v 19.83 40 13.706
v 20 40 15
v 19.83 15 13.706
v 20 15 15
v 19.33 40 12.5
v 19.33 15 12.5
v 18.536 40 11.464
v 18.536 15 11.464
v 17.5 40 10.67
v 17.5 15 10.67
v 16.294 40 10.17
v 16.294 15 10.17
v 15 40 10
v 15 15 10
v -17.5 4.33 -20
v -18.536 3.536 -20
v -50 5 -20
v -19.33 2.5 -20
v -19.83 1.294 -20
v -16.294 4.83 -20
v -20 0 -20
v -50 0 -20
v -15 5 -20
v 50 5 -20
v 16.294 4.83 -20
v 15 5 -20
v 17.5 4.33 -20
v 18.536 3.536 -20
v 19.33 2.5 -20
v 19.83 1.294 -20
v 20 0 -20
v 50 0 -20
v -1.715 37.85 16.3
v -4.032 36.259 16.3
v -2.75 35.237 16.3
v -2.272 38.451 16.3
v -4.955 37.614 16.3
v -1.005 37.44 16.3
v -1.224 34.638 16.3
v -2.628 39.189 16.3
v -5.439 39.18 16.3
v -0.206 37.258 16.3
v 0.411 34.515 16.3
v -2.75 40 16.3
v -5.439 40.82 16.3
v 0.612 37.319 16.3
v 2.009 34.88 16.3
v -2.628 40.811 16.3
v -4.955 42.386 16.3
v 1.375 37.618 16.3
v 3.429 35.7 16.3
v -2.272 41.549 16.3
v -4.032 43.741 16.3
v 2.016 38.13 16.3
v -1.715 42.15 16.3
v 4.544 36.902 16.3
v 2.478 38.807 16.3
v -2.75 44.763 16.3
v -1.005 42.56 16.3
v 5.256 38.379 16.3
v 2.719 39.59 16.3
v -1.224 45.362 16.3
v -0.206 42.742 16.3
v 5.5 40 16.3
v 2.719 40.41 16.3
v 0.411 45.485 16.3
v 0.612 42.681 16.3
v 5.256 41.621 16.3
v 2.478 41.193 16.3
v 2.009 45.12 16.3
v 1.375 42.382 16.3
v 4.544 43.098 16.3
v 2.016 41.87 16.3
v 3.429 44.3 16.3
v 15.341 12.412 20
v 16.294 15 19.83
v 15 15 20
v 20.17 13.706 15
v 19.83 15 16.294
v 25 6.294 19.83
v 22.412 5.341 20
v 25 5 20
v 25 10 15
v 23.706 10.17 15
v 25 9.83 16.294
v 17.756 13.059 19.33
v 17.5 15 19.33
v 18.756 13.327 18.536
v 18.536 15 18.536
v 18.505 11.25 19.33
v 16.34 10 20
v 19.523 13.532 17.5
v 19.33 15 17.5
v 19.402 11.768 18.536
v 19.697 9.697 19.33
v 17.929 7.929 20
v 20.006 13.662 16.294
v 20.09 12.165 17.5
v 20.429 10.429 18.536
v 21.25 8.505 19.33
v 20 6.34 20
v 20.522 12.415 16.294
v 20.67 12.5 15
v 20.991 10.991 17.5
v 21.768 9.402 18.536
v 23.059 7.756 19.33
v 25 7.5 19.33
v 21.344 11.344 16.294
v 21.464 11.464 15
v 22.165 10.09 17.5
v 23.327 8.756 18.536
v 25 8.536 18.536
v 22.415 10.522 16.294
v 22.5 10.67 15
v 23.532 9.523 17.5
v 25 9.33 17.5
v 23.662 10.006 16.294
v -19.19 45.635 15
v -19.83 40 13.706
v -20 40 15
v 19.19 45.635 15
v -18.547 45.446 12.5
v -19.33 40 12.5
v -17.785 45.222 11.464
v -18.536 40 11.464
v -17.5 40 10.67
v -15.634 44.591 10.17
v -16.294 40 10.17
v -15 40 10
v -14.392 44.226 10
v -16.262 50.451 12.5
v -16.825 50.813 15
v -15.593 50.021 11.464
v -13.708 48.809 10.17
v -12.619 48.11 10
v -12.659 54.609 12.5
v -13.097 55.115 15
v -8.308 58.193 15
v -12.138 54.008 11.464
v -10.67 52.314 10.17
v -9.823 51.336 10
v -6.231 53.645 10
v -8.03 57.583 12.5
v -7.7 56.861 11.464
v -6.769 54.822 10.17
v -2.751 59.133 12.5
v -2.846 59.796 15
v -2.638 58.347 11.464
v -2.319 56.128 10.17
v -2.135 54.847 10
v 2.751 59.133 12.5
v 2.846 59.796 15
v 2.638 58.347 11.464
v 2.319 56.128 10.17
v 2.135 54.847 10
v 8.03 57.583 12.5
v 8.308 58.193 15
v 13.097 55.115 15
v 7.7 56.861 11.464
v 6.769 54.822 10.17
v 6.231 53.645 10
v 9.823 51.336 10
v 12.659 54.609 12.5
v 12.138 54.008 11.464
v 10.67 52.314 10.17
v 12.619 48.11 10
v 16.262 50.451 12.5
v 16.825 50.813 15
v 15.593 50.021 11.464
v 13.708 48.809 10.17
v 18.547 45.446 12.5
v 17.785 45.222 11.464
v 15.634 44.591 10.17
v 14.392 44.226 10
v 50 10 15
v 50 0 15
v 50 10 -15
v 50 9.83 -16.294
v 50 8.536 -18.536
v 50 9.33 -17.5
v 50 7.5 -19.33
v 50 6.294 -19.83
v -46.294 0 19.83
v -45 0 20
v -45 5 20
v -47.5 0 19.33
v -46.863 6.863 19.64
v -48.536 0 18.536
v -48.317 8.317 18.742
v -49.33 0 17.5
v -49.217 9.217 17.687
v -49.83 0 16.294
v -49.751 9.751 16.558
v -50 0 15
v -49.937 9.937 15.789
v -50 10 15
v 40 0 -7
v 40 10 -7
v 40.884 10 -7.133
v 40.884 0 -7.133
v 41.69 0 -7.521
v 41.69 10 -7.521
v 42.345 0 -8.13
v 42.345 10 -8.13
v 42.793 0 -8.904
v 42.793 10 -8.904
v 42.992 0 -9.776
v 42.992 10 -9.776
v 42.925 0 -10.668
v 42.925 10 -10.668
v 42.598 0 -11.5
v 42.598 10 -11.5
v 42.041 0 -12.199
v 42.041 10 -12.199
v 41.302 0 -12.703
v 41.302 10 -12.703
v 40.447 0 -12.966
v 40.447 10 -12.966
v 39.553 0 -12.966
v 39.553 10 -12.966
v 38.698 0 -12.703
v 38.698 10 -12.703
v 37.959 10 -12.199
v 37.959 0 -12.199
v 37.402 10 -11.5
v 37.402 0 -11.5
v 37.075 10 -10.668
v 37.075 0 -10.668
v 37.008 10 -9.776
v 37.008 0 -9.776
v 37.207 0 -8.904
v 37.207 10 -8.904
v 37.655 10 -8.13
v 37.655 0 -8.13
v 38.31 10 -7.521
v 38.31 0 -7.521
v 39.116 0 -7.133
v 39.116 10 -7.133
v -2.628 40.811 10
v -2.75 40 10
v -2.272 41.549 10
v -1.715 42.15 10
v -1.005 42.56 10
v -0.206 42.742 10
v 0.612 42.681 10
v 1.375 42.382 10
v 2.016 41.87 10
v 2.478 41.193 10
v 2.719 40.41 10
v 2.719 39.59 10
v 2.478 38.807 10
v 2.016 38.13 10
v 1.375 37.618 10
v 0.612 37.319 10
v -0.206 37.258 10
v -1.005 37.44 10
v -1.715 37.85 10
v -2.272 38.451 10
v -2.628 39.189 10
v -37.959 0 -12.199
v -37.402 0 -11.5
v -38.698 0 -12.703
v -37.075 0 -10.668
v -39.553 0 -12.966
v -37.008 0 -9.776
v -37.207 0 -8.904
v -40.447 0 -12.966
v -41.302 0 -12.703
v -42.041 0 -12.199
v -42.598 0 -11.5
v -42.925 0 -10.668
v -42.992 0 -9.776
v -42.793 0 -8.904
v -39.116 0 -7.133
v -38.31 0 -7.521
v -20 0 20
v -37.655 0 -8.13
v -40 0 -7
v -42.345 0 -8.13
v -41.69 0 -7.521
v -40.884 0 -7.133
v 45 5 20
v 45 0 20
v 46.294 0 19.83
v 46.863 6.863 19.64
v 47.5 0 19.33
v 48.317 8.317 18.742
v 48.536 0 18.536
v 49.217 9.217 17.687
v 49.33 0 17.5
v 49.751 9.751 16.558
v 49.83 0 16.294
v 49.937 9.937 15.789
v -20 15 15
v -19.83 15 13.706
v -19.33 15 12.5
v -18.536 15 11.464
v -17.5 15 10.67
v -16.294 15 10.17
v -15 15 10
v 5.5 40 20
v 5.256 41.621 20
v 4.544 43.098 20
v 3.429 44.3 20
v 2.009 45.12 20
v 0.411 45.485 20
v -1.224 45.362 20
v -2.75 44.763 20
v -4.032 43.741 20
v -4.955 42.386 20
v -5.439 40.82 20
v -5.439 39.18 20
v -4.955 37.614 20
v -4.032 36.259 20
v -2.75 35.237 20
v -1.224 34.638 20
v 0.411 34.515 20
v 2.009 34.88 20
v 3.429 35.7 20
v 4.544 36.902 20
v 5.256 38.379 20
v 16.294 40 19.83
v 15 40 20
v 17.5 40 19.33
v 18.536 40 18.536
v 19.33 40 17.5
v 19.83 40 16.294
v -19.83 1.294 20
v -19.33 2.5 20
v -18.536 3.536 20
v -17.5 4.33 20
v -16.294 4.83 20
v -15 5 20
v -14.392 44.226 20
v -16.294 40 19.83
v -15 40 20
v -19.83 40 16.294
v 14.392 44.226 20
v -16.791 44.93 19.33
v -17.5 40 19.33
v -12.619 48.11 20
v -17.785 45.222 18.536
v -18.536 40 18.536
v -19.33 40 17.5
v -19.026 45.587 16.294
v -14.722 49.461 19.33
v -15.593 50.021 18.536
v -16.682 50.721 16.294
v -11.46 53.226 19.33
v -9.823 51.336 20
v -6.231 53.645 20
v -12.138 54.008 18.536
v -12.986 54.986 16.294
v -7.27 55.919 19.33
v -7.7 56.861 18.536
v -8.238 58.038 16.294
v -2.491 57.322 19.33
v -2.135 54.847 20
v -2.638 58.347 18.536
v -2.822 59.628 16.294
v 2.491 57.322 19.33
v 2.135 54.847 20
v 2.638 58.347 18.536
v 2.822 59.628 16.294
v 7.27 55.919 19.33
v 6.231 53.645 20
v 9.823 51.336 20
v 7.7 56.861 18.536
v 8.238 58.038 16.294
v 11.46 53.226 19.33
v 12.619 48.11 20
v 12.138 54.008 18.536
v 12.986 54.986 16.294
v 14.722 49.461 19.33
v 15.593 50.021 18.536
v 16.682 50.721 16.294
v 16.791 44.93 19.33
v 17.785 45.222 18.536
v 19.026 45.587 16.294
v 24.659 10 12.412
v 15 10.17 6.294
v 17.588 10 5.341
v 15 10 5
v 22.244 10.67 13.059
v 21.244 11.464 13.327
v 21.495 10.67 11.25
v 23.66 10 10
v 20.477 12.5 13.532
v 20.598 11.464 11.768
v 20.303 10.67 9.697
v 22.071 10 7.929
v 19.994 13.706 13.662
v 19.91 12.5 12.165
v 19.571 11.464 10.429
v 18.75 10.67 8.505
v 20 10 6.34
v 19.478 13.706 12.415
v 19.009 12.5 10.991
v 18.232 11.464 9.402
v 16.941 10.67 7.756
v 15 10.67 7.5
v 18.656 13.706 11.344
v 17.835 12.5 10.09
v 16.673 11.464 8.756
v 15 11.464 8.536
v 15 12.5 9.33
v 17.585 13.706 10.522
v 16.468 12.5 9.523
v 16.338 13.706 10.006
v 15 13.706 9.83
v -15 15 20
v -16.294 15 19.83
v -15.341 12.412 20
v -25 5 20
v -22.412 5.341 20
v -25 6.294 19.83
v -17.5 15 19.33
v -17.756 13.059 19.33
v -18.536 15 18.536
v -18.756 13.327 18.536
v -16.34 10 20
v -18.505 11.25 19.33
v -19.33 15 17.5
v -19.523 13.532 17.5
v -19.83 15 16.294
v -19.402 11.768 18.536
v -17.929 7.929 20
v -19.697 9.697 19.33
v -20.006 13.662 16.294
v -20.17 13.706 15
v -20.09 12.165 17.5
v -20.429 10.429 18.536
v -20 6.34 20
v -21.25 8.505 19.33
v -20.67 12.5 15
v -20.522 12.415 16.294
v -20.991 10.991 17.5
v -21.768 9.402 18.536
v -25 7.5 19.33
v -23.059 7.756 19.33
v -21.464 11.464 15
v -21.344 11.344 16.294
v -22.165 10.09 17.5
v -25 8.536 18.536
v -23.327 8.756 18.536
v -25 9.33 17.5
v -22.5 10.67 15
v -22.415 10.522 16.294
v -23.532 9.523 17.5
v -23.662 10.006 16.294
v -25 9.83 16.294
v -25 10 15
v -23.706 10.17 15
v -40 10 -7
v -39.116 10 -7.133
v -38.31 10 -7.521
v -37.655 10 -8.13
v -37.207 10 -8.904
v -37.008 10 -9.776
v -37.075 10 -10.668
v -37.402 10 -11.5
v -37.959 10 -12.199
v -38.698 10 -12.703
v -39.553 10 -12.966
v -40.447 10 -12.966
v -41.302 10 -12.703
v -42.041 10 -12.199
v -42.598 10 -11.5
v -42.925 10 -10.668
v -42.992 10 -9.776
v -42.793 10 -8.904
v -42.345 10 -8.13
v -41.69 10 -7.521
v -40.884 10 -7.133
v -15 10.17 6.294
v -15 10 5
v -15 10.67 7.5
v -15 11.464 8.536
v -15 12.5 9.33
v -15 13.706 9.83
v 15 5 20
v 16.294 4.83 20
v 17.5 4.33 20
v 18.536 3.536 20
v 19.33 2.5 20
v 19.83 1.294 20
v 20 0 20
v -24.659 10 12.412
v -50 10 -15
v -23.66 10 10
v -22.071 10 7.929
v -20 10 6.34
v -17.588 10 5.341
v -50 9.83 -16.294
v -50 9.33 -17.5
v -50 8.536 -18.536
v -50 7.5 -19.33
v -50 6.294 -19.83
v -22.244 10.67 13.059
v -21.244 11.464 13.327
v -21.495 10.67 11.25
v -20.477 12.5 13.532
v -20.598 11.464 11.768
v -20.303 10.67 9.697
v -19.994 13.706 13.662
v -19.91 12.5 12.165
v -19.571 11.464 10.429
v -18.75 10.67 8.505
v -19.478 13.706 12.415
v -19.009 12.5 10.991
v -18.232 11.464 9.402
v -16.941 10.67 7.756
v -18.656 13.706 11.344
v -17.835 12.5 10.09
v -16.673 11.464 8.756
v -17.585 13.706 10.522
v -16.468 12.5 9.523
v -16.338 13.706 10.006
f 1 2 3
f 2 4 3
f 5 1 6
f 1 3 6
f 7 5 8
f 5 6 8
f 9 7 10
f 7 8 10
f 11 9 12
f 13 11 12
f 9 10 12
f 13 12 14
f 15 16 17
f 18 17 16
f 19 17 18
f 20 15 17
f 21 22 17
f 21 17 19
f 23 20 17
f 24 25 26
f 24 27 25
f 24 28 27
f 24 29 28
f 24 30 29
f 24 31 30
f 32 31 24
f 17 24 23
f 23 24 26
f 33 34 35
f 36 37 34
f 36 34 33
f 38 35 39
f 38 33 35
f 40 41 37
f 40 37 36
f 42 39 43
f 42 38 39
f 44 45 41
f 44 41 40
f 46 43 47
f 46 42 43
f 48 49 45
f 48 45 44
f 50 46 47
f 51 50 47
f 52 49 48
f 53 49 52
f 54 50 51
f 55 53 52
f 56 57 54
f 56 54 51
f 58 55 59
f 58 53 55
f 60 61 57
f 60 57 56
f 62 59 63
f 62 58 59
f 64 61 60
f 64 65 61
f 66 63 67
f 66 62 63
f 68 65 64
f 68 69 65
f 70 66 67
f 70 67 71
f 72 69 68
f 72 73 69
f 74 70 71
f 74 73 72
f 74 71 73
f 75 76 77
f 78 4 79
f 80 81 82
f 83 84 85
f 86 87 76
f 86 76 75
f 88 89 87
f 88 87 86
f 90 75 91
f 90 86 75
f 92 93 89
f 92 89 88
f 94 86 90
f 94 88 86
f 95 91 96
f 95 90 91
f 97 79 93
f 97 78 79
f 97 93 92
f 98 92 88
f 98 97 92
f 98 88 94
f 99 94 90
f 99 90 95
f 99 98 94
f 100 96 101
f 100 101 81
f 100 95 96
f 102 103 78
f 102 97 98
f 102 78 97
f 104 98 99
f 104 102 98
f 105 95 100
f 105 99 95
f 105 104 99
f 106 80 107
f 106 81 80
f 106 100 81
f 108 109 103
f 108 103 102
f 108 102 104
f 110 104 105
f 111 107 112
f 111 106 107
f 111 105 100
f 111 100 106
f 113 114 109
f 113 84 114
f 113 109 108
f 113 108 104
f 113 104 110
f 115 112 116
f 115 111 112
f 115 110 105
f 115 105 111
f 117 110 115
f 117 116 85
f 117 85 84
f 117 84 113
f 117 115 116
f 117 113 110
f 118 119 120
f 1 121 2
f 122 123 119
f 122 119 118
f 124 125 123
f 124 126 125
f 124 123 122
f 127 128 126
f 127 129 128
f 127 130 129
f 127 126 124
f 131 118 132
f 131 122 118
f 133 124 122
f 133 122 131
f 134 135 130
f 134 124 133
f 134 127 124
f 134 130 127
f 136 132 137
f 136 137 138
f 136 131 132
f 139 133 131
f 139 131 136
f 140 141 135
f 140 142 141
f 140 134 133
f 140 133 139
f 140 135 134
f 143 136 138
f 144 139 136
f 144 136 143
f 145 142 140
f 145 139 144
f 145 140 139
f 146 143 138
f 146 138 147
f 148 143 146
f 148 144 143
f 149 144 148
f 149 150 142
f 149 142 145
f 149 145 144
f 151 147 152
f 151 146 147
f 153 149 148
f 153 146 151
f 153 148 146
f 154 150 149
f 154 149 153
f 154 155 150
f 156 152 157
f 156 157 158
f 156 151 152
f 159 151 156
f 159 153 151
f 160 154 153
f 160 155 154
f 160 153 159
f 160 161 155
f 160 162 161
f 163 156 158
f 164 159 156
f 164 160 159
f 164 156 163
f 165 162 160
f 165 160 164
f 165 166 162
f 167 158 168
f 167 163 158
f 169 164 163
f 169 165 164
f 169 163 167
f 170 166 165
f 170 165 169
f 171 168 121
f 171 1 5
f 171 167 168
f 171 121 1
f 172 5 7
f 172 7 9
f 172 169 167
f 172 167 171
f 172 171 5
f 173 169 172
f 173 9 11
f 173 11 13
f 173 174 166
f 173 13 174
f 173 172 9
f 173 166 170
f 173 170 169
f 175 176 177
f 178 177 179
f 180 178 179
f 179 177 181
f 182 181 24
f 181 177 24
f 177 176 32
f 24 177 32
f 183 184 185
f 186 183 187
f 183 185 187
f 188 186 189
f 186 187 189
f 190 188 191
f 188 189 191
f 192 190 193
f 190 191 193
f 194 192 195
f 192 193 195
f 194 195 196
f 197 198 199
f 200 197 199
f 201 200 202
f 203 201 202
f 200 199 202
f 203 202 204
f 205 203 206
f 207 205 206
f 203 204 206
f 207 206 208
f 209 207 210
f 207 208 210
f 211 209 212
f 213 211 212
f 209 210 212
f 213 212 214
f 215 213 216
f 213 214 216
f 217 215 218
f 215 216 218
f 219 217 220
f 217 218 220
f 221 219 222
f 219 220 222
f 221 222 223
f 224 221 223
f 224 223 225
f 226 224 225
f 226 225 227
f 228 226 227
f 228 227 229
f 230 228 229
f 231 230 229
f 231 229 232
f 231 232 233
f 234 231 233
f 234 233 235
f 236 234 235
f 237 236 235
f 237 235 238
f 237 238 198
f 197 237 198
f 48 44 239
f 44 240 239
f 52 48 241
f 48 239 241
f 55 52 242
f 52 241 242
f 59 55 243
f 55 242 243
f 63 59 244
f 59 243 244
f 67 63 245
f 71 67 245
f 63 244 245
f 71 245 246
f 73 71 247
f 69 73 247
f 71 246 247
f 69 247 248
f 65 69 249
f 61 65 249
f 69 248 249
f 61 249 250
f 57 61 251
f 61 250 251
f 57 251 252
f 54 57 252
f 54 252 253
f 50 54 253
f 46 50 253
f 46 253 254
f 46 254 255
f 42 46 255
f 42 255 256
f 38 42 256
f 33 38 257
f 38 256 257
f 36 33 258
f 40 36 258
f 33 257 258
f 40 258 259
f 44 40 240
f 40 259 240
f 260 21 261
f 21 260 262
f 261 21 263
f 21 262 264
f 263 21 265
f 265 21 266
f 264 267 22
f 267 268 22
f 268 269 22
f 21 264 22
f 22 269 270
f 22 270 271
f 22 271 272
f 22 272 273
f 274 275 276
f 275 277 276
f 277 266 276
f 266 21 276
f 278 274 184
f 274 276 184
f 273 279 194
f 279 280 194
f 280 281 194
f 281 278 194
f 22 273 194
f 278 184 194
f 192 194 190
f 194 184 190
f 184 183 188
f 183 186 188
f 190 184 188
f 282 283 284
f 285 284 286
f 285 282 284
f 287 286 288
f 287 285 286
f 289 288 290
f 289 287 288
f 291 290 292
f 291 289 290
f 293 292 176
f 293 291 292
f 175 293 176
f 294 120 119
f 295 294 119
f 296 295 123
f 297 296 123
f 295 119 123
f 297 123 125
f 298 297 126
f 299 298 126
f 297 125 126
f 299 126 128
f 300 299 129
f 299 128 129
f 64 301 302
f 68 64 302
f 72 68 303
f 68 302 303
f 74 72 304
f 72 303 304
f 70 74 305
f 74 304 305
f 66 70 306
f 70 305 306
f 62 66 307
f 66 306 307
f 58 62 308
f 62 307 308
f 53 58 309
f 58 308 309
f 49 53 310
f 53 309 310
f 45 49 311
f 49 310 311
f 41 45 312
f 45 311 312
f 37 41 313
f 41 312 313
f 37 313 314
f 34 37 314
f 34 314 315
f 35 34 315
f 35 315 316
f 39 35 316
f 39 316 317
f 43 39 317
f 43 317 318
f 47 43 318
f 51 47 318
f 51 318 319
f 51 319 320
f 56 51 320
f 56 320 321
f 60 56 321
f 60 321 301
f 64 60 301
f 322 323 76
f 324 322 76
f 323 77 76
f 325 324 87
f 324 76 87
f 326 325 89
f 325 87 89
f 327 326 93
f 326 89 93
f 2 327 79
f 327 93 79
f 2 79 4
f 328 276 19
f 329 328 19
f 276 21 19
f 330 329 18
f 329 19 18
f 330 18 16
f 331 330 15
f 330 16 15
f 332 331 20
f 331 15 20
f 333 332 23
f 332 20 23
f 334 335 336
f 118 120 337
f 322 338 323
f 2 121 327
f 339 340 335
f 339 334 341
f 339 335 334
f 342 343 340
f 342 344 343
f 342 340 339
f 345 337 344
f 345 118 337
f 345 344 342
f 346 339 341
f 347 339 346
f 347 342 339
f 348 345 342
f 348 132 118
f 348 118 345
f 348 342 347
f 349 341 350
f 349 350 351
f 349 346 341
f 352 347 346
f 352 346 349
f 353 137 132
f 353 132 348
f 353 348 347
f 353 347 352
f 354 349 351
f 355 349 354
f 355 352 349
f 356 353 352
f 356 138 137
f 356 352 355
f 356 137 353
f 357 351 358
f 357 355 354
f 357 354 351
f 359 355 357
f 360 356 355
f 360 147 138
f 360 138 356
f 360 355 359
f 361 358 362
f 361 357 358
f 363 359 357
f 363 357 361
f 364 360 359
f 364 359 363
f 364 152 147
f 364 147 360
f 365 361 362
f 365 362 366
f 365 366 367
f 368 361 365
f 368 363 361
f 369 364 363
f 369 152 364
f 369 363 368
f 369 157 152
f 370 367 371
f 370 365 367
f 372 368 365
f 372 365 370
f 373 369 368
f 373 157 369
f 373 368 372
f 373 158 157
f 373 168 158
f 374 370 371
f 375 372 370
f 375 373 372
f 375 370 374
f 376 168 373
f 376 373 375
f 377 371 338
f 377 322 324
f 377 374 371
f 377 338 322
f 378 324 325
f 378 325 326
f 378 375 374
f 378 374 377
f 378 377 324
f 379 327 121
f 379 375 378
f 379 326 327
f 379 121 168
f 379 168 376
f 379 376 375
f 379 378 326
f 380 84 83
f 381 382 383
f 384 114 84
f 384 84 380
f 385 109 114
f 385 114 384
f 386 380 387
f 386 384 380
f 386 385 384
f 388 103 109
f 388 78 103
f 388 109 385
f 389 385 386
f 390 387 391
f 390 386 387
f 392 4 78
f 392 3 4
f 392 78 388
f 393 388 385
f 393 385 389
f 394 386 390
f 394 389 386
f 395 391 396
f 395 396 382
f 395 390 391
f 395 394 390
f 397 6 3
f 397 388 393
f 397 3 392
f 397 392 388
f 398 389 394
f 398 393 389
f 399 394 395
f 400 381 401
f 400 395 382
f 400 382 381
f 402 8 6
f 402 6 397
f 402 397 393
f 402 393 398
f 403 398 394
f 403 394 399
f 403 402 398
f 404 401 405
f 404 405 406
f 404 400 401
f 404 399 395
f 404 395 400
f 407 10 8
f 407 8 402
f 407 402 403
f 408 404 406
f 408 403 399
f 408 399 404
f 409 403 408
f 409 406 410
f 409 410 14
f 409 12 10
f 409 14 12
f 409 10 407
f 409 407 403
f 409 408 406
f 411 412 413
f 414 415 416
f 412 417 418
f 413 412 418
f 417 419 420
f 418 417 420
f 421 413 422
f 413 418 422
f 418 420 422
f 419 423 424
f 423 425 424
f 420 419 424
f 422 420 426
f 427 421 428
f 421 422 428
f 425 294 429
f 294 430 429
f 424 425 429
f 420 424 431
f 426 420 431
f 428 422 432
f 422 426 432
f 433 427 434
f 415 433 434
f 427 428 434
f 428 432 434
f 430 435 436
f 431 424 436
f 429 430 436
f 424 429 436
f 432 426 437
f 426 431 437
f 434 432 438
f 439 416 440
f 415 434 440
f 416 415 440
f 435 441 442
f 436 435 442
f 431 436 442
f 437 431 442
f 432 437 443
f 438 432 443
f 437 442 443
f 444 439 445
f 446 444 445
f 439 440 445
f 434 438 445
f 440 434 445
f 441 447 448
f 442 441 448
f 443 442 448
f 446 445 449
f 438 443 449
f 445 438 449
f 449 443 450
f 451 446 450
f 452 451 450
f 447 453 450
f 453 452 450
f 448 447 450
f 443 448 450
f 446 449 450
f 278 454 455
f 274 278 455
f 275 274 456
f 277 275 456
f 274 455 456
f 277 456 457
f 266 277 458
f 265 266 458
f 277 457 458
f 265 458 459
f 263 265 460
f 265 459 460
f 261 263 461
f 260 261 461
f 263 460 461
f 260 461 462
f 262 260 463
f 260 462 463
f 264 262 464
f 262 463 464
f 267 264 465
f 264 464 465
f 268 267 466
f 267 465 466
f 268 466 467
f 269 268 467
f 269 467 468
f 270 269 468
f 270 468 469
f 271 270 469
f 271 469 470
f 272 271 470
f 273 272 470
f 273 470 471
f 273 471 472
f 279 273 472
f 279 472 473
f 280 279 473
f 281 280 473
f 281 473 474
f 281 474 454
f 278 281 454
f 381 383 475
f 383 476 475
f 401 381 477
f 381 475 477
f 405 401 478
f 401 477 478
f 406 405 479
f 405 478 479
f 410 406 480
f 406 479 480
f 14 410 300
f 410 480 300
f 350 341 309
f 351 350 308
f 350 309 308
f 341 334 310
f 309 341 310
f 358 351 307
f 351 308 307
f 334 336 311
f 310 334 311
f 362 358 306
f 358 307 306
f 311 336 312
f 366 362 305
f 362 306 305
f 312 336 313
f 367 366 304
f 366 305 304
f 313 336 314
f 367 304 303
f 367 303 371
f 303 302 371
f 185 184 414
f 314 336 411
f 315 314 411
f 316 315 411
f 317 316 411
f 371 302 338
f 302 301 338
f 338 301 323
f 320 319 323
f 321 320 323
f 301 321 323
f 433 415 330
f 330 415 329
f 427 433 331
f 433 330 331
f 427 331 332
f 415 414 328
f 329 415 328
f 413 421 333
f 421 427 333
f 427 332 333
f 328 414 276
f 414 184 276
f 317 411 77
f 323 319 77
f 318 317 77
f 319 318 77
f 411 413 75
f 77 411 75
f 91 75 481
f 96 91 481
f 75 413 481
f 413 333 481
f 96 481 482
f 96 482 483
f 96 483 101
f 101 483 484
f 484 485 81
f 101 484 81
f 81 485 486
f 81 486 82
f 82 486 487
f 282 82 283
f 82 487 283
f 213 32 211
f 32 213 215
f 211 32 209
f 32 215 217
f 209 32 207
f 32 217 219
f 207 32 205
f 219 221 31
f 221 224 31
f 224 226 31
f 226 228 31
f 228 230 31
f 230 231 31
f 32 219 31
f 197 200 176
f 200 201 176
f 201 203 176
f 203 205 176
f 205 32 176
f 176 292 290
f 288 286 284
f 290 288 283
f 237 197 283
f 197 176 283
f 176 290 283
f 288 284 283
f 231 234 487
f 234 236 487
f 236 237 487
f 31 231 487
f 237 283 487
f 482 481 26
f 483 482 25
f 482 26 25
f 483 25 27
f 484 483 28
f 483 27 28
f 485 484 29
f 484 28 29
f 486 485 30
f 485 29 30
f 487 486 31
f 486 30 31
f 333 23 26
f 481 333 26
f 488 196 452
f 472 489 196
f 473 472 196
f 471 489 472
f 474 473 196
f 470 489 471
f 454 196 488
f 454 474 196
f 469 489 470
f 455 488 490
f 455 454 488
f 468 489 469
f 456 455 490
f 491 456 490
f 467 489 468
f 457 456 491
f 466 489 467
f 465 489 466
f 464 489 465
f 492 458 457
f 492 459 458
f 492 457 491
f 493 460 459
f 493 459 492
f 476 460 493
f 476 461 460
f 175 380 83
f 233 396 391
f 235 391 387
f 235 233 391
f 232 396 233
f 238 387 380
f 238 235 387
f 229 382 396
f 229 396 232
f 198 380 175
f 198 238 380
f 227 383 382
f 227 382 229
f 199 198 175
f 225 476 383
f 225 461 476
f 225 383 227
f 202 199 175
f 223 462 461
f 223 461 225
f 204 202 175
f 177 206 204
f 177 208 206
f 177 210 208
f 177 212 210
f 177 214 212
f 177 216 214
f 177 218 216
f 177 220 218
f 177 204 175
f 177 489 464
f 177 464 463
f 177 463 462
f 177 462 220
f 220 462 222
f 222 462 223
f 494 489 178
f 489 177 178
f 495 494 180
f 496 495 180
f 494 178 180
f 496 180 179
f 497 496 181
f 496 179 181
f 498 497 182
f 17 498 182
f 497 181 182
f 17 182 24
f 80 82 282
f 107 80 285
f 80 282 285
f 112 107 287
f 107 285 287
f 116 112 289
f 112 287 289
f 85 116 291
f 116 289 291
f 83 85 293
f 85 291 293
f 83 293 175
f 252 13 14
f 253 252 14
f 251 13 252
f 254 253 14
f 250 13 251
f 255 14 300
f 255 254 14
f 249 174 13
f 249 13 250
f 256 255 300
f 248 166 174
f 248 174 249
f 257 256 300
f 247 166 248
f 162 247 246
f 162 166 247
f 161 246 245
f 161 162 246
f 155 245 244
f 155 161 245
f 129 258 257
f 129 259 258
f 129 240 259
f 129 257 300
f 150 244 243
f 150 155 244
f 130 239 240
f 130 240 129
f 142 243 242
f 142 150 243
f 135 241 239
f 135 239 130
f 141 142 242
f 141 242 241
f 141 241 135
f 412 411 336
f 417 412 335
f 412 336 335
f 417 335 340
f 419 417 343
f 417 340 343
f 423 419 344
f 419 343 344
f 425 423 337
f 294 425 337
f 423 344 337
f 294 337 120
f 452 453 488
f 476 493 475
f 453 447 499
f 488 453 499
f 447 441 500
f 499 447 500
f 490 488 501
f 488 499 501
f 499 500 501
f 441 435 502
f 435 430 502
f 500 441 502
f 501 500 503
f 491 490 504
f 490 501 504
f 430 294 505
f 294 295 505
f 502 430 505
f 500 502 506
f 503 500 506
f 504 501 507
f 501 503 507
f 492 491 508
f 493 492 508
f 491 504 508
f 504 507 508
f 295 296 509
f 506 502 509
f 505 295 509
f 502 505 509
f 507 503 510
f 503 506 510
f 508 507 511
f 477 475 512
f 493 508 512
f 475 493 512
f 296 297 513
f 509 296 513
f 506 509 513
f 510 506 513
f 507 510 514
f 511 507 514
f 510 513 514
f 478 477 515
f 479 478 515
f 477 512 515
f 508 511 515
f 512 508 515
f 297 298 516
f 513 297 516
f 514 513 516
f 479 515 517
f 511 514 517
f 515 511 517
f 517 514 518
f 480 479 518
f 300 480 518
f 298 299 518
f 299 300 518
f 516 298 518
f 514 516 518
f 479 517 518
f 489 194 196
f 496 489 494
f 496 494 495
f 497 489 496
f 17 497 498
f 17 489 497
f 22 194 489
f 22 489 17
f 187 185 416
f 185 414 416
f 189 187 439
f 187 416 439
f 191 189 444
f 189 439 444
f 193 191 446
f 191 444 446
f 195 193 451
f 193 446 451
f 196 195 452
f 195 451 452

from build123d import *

# Parameters (mm, degrees)
ESBO_O1_W                                           = 100
ESBO_O1_H                                           = 40
RESSALTO_EXTRUS_O1_DEPTH                            = 10
RESSALTO_EXTRUS_O2_DEPTH                            = 10
ESBO_O3_R                                           = 3
CORTE_EXTRUS_O1_DEPTH                               = 74.484692283
REBAIXO_PARA_PARAFUSO_COM_CABE_A_PANELA_D           = 5.5
REBAIXO_PARA_PARAFUSO_COM_CABE_A_PANELA_CBORE_D     = 11
REBAIXO_PARA_PARAFUSO_COM_CABE_A_PANELA_CBORE_DEPTH = 3.7
ESBO_O6_W                                           = 40
ESBO_O6_H                                           = 5
CORTE_EXTRUS_O2_DEPTH                               = 88.749643874
FILETE1_R                                           = 5


with BuildPart() as part:
    # Esboço1 → Ressalto-extrusão1 (new body)
    with BuildSketch(Plane(origin=(0, 0, 0), x_dir=(1, 0, 0), z_dir=(0, 1, 0))):
        Rectangle(ESBO_O1_W, ESBO_O1_H)
    extrude(amount=RESSALTO_EXTRUS_O1_DEPTH)

    # Esboço2 → Ressalto-extrusão2 (add)
    with BuildSketch(Plane.XY.offset(20)):
        with BuildLine():
            Line((-20, 0), (-20, 40))
            ThreePointArc((-20, 40), (0, 60), (20, 40))
            Line((20, 40), (20, 0))
            Line((20, 0), (-20, 0))
        make_face()
    extrude(amount=-RESSALTO_EXTRUS_O2_DEPTH)

    # Esboço3 → Corte-extrusão1 (cut, through all)
    with BuildSketch(Plane(origin=(0, 10, 0), x_dir=(1, 0, 0), z_dir=(0, 1, 0))):
        with Locations(Location((-40, 10, 0), (0, 0, 270))):
            Circle(ESBO_O3_R)
        with Locations(Location((40, 10, 0), (0, 0, 270))):
            Circle(ESBO_O3_R)
    extrude(amount=-CORTE_EXTRUS_O1_DEPTH, mode=Mode.SUBTRACT)

    # Rebaixo para parafuso com cabeça panela de M51 (through all)
    with Locations(Plane(origin=(0, 40, 20), x_dir=(1, 0, 0), z_dir=(0, 0, 1))):
        with Locations((0, 0)):
            CounterBoreHole(REBAIXO_PARA_PARAFUSO_COM_CABE_A_PANELA_D / 2, REBAIXO_PARA_PARAFUSO_COM_CABE_A_PANELA_CBORE_D / 2, REBAIXO_PARA_PARAFUSO_COM_CABE_A_PANELA_CBORE_DEPTH)

    # Esboço6 → Corte-extrusão2 (cut, through all)
    with BuildSketch(Plane.XY.offset(20)):
        with Locations((0, 2.5)):
            Rectangle(ESBO_O6_W, ESBO_O6_H)
    extrude(amount=-CORTE_EXTRUS_O2_DEPTH, mode=Mode.SUBTRACT)

    # Filete1
    filete1_edges = [part.edges().sort_by_distance(p)[0] for p in [
        (-35, 10, 20),
        (35, 10, 20),
        (-20, 25, 10),
        (-20, 10, 15),
        (0, 60, 10),
        (20, 10, 15),
        (20, 25, 10),
        (0, 10, 10),
        (20, 25, 20),
        (0, 60, 20),
        (-20, 25, 20),
        (-20, 5, 0),
        (20, 5, 0),
        (0, 10, -20),
        (50, 5, 20),
        (-50, 5, 20),
    ]]
    fillet(filete1_edges, radius=FILETE1_R - 0.0001)  # a hair under: the kernel refuses the full size


solid = part.part
